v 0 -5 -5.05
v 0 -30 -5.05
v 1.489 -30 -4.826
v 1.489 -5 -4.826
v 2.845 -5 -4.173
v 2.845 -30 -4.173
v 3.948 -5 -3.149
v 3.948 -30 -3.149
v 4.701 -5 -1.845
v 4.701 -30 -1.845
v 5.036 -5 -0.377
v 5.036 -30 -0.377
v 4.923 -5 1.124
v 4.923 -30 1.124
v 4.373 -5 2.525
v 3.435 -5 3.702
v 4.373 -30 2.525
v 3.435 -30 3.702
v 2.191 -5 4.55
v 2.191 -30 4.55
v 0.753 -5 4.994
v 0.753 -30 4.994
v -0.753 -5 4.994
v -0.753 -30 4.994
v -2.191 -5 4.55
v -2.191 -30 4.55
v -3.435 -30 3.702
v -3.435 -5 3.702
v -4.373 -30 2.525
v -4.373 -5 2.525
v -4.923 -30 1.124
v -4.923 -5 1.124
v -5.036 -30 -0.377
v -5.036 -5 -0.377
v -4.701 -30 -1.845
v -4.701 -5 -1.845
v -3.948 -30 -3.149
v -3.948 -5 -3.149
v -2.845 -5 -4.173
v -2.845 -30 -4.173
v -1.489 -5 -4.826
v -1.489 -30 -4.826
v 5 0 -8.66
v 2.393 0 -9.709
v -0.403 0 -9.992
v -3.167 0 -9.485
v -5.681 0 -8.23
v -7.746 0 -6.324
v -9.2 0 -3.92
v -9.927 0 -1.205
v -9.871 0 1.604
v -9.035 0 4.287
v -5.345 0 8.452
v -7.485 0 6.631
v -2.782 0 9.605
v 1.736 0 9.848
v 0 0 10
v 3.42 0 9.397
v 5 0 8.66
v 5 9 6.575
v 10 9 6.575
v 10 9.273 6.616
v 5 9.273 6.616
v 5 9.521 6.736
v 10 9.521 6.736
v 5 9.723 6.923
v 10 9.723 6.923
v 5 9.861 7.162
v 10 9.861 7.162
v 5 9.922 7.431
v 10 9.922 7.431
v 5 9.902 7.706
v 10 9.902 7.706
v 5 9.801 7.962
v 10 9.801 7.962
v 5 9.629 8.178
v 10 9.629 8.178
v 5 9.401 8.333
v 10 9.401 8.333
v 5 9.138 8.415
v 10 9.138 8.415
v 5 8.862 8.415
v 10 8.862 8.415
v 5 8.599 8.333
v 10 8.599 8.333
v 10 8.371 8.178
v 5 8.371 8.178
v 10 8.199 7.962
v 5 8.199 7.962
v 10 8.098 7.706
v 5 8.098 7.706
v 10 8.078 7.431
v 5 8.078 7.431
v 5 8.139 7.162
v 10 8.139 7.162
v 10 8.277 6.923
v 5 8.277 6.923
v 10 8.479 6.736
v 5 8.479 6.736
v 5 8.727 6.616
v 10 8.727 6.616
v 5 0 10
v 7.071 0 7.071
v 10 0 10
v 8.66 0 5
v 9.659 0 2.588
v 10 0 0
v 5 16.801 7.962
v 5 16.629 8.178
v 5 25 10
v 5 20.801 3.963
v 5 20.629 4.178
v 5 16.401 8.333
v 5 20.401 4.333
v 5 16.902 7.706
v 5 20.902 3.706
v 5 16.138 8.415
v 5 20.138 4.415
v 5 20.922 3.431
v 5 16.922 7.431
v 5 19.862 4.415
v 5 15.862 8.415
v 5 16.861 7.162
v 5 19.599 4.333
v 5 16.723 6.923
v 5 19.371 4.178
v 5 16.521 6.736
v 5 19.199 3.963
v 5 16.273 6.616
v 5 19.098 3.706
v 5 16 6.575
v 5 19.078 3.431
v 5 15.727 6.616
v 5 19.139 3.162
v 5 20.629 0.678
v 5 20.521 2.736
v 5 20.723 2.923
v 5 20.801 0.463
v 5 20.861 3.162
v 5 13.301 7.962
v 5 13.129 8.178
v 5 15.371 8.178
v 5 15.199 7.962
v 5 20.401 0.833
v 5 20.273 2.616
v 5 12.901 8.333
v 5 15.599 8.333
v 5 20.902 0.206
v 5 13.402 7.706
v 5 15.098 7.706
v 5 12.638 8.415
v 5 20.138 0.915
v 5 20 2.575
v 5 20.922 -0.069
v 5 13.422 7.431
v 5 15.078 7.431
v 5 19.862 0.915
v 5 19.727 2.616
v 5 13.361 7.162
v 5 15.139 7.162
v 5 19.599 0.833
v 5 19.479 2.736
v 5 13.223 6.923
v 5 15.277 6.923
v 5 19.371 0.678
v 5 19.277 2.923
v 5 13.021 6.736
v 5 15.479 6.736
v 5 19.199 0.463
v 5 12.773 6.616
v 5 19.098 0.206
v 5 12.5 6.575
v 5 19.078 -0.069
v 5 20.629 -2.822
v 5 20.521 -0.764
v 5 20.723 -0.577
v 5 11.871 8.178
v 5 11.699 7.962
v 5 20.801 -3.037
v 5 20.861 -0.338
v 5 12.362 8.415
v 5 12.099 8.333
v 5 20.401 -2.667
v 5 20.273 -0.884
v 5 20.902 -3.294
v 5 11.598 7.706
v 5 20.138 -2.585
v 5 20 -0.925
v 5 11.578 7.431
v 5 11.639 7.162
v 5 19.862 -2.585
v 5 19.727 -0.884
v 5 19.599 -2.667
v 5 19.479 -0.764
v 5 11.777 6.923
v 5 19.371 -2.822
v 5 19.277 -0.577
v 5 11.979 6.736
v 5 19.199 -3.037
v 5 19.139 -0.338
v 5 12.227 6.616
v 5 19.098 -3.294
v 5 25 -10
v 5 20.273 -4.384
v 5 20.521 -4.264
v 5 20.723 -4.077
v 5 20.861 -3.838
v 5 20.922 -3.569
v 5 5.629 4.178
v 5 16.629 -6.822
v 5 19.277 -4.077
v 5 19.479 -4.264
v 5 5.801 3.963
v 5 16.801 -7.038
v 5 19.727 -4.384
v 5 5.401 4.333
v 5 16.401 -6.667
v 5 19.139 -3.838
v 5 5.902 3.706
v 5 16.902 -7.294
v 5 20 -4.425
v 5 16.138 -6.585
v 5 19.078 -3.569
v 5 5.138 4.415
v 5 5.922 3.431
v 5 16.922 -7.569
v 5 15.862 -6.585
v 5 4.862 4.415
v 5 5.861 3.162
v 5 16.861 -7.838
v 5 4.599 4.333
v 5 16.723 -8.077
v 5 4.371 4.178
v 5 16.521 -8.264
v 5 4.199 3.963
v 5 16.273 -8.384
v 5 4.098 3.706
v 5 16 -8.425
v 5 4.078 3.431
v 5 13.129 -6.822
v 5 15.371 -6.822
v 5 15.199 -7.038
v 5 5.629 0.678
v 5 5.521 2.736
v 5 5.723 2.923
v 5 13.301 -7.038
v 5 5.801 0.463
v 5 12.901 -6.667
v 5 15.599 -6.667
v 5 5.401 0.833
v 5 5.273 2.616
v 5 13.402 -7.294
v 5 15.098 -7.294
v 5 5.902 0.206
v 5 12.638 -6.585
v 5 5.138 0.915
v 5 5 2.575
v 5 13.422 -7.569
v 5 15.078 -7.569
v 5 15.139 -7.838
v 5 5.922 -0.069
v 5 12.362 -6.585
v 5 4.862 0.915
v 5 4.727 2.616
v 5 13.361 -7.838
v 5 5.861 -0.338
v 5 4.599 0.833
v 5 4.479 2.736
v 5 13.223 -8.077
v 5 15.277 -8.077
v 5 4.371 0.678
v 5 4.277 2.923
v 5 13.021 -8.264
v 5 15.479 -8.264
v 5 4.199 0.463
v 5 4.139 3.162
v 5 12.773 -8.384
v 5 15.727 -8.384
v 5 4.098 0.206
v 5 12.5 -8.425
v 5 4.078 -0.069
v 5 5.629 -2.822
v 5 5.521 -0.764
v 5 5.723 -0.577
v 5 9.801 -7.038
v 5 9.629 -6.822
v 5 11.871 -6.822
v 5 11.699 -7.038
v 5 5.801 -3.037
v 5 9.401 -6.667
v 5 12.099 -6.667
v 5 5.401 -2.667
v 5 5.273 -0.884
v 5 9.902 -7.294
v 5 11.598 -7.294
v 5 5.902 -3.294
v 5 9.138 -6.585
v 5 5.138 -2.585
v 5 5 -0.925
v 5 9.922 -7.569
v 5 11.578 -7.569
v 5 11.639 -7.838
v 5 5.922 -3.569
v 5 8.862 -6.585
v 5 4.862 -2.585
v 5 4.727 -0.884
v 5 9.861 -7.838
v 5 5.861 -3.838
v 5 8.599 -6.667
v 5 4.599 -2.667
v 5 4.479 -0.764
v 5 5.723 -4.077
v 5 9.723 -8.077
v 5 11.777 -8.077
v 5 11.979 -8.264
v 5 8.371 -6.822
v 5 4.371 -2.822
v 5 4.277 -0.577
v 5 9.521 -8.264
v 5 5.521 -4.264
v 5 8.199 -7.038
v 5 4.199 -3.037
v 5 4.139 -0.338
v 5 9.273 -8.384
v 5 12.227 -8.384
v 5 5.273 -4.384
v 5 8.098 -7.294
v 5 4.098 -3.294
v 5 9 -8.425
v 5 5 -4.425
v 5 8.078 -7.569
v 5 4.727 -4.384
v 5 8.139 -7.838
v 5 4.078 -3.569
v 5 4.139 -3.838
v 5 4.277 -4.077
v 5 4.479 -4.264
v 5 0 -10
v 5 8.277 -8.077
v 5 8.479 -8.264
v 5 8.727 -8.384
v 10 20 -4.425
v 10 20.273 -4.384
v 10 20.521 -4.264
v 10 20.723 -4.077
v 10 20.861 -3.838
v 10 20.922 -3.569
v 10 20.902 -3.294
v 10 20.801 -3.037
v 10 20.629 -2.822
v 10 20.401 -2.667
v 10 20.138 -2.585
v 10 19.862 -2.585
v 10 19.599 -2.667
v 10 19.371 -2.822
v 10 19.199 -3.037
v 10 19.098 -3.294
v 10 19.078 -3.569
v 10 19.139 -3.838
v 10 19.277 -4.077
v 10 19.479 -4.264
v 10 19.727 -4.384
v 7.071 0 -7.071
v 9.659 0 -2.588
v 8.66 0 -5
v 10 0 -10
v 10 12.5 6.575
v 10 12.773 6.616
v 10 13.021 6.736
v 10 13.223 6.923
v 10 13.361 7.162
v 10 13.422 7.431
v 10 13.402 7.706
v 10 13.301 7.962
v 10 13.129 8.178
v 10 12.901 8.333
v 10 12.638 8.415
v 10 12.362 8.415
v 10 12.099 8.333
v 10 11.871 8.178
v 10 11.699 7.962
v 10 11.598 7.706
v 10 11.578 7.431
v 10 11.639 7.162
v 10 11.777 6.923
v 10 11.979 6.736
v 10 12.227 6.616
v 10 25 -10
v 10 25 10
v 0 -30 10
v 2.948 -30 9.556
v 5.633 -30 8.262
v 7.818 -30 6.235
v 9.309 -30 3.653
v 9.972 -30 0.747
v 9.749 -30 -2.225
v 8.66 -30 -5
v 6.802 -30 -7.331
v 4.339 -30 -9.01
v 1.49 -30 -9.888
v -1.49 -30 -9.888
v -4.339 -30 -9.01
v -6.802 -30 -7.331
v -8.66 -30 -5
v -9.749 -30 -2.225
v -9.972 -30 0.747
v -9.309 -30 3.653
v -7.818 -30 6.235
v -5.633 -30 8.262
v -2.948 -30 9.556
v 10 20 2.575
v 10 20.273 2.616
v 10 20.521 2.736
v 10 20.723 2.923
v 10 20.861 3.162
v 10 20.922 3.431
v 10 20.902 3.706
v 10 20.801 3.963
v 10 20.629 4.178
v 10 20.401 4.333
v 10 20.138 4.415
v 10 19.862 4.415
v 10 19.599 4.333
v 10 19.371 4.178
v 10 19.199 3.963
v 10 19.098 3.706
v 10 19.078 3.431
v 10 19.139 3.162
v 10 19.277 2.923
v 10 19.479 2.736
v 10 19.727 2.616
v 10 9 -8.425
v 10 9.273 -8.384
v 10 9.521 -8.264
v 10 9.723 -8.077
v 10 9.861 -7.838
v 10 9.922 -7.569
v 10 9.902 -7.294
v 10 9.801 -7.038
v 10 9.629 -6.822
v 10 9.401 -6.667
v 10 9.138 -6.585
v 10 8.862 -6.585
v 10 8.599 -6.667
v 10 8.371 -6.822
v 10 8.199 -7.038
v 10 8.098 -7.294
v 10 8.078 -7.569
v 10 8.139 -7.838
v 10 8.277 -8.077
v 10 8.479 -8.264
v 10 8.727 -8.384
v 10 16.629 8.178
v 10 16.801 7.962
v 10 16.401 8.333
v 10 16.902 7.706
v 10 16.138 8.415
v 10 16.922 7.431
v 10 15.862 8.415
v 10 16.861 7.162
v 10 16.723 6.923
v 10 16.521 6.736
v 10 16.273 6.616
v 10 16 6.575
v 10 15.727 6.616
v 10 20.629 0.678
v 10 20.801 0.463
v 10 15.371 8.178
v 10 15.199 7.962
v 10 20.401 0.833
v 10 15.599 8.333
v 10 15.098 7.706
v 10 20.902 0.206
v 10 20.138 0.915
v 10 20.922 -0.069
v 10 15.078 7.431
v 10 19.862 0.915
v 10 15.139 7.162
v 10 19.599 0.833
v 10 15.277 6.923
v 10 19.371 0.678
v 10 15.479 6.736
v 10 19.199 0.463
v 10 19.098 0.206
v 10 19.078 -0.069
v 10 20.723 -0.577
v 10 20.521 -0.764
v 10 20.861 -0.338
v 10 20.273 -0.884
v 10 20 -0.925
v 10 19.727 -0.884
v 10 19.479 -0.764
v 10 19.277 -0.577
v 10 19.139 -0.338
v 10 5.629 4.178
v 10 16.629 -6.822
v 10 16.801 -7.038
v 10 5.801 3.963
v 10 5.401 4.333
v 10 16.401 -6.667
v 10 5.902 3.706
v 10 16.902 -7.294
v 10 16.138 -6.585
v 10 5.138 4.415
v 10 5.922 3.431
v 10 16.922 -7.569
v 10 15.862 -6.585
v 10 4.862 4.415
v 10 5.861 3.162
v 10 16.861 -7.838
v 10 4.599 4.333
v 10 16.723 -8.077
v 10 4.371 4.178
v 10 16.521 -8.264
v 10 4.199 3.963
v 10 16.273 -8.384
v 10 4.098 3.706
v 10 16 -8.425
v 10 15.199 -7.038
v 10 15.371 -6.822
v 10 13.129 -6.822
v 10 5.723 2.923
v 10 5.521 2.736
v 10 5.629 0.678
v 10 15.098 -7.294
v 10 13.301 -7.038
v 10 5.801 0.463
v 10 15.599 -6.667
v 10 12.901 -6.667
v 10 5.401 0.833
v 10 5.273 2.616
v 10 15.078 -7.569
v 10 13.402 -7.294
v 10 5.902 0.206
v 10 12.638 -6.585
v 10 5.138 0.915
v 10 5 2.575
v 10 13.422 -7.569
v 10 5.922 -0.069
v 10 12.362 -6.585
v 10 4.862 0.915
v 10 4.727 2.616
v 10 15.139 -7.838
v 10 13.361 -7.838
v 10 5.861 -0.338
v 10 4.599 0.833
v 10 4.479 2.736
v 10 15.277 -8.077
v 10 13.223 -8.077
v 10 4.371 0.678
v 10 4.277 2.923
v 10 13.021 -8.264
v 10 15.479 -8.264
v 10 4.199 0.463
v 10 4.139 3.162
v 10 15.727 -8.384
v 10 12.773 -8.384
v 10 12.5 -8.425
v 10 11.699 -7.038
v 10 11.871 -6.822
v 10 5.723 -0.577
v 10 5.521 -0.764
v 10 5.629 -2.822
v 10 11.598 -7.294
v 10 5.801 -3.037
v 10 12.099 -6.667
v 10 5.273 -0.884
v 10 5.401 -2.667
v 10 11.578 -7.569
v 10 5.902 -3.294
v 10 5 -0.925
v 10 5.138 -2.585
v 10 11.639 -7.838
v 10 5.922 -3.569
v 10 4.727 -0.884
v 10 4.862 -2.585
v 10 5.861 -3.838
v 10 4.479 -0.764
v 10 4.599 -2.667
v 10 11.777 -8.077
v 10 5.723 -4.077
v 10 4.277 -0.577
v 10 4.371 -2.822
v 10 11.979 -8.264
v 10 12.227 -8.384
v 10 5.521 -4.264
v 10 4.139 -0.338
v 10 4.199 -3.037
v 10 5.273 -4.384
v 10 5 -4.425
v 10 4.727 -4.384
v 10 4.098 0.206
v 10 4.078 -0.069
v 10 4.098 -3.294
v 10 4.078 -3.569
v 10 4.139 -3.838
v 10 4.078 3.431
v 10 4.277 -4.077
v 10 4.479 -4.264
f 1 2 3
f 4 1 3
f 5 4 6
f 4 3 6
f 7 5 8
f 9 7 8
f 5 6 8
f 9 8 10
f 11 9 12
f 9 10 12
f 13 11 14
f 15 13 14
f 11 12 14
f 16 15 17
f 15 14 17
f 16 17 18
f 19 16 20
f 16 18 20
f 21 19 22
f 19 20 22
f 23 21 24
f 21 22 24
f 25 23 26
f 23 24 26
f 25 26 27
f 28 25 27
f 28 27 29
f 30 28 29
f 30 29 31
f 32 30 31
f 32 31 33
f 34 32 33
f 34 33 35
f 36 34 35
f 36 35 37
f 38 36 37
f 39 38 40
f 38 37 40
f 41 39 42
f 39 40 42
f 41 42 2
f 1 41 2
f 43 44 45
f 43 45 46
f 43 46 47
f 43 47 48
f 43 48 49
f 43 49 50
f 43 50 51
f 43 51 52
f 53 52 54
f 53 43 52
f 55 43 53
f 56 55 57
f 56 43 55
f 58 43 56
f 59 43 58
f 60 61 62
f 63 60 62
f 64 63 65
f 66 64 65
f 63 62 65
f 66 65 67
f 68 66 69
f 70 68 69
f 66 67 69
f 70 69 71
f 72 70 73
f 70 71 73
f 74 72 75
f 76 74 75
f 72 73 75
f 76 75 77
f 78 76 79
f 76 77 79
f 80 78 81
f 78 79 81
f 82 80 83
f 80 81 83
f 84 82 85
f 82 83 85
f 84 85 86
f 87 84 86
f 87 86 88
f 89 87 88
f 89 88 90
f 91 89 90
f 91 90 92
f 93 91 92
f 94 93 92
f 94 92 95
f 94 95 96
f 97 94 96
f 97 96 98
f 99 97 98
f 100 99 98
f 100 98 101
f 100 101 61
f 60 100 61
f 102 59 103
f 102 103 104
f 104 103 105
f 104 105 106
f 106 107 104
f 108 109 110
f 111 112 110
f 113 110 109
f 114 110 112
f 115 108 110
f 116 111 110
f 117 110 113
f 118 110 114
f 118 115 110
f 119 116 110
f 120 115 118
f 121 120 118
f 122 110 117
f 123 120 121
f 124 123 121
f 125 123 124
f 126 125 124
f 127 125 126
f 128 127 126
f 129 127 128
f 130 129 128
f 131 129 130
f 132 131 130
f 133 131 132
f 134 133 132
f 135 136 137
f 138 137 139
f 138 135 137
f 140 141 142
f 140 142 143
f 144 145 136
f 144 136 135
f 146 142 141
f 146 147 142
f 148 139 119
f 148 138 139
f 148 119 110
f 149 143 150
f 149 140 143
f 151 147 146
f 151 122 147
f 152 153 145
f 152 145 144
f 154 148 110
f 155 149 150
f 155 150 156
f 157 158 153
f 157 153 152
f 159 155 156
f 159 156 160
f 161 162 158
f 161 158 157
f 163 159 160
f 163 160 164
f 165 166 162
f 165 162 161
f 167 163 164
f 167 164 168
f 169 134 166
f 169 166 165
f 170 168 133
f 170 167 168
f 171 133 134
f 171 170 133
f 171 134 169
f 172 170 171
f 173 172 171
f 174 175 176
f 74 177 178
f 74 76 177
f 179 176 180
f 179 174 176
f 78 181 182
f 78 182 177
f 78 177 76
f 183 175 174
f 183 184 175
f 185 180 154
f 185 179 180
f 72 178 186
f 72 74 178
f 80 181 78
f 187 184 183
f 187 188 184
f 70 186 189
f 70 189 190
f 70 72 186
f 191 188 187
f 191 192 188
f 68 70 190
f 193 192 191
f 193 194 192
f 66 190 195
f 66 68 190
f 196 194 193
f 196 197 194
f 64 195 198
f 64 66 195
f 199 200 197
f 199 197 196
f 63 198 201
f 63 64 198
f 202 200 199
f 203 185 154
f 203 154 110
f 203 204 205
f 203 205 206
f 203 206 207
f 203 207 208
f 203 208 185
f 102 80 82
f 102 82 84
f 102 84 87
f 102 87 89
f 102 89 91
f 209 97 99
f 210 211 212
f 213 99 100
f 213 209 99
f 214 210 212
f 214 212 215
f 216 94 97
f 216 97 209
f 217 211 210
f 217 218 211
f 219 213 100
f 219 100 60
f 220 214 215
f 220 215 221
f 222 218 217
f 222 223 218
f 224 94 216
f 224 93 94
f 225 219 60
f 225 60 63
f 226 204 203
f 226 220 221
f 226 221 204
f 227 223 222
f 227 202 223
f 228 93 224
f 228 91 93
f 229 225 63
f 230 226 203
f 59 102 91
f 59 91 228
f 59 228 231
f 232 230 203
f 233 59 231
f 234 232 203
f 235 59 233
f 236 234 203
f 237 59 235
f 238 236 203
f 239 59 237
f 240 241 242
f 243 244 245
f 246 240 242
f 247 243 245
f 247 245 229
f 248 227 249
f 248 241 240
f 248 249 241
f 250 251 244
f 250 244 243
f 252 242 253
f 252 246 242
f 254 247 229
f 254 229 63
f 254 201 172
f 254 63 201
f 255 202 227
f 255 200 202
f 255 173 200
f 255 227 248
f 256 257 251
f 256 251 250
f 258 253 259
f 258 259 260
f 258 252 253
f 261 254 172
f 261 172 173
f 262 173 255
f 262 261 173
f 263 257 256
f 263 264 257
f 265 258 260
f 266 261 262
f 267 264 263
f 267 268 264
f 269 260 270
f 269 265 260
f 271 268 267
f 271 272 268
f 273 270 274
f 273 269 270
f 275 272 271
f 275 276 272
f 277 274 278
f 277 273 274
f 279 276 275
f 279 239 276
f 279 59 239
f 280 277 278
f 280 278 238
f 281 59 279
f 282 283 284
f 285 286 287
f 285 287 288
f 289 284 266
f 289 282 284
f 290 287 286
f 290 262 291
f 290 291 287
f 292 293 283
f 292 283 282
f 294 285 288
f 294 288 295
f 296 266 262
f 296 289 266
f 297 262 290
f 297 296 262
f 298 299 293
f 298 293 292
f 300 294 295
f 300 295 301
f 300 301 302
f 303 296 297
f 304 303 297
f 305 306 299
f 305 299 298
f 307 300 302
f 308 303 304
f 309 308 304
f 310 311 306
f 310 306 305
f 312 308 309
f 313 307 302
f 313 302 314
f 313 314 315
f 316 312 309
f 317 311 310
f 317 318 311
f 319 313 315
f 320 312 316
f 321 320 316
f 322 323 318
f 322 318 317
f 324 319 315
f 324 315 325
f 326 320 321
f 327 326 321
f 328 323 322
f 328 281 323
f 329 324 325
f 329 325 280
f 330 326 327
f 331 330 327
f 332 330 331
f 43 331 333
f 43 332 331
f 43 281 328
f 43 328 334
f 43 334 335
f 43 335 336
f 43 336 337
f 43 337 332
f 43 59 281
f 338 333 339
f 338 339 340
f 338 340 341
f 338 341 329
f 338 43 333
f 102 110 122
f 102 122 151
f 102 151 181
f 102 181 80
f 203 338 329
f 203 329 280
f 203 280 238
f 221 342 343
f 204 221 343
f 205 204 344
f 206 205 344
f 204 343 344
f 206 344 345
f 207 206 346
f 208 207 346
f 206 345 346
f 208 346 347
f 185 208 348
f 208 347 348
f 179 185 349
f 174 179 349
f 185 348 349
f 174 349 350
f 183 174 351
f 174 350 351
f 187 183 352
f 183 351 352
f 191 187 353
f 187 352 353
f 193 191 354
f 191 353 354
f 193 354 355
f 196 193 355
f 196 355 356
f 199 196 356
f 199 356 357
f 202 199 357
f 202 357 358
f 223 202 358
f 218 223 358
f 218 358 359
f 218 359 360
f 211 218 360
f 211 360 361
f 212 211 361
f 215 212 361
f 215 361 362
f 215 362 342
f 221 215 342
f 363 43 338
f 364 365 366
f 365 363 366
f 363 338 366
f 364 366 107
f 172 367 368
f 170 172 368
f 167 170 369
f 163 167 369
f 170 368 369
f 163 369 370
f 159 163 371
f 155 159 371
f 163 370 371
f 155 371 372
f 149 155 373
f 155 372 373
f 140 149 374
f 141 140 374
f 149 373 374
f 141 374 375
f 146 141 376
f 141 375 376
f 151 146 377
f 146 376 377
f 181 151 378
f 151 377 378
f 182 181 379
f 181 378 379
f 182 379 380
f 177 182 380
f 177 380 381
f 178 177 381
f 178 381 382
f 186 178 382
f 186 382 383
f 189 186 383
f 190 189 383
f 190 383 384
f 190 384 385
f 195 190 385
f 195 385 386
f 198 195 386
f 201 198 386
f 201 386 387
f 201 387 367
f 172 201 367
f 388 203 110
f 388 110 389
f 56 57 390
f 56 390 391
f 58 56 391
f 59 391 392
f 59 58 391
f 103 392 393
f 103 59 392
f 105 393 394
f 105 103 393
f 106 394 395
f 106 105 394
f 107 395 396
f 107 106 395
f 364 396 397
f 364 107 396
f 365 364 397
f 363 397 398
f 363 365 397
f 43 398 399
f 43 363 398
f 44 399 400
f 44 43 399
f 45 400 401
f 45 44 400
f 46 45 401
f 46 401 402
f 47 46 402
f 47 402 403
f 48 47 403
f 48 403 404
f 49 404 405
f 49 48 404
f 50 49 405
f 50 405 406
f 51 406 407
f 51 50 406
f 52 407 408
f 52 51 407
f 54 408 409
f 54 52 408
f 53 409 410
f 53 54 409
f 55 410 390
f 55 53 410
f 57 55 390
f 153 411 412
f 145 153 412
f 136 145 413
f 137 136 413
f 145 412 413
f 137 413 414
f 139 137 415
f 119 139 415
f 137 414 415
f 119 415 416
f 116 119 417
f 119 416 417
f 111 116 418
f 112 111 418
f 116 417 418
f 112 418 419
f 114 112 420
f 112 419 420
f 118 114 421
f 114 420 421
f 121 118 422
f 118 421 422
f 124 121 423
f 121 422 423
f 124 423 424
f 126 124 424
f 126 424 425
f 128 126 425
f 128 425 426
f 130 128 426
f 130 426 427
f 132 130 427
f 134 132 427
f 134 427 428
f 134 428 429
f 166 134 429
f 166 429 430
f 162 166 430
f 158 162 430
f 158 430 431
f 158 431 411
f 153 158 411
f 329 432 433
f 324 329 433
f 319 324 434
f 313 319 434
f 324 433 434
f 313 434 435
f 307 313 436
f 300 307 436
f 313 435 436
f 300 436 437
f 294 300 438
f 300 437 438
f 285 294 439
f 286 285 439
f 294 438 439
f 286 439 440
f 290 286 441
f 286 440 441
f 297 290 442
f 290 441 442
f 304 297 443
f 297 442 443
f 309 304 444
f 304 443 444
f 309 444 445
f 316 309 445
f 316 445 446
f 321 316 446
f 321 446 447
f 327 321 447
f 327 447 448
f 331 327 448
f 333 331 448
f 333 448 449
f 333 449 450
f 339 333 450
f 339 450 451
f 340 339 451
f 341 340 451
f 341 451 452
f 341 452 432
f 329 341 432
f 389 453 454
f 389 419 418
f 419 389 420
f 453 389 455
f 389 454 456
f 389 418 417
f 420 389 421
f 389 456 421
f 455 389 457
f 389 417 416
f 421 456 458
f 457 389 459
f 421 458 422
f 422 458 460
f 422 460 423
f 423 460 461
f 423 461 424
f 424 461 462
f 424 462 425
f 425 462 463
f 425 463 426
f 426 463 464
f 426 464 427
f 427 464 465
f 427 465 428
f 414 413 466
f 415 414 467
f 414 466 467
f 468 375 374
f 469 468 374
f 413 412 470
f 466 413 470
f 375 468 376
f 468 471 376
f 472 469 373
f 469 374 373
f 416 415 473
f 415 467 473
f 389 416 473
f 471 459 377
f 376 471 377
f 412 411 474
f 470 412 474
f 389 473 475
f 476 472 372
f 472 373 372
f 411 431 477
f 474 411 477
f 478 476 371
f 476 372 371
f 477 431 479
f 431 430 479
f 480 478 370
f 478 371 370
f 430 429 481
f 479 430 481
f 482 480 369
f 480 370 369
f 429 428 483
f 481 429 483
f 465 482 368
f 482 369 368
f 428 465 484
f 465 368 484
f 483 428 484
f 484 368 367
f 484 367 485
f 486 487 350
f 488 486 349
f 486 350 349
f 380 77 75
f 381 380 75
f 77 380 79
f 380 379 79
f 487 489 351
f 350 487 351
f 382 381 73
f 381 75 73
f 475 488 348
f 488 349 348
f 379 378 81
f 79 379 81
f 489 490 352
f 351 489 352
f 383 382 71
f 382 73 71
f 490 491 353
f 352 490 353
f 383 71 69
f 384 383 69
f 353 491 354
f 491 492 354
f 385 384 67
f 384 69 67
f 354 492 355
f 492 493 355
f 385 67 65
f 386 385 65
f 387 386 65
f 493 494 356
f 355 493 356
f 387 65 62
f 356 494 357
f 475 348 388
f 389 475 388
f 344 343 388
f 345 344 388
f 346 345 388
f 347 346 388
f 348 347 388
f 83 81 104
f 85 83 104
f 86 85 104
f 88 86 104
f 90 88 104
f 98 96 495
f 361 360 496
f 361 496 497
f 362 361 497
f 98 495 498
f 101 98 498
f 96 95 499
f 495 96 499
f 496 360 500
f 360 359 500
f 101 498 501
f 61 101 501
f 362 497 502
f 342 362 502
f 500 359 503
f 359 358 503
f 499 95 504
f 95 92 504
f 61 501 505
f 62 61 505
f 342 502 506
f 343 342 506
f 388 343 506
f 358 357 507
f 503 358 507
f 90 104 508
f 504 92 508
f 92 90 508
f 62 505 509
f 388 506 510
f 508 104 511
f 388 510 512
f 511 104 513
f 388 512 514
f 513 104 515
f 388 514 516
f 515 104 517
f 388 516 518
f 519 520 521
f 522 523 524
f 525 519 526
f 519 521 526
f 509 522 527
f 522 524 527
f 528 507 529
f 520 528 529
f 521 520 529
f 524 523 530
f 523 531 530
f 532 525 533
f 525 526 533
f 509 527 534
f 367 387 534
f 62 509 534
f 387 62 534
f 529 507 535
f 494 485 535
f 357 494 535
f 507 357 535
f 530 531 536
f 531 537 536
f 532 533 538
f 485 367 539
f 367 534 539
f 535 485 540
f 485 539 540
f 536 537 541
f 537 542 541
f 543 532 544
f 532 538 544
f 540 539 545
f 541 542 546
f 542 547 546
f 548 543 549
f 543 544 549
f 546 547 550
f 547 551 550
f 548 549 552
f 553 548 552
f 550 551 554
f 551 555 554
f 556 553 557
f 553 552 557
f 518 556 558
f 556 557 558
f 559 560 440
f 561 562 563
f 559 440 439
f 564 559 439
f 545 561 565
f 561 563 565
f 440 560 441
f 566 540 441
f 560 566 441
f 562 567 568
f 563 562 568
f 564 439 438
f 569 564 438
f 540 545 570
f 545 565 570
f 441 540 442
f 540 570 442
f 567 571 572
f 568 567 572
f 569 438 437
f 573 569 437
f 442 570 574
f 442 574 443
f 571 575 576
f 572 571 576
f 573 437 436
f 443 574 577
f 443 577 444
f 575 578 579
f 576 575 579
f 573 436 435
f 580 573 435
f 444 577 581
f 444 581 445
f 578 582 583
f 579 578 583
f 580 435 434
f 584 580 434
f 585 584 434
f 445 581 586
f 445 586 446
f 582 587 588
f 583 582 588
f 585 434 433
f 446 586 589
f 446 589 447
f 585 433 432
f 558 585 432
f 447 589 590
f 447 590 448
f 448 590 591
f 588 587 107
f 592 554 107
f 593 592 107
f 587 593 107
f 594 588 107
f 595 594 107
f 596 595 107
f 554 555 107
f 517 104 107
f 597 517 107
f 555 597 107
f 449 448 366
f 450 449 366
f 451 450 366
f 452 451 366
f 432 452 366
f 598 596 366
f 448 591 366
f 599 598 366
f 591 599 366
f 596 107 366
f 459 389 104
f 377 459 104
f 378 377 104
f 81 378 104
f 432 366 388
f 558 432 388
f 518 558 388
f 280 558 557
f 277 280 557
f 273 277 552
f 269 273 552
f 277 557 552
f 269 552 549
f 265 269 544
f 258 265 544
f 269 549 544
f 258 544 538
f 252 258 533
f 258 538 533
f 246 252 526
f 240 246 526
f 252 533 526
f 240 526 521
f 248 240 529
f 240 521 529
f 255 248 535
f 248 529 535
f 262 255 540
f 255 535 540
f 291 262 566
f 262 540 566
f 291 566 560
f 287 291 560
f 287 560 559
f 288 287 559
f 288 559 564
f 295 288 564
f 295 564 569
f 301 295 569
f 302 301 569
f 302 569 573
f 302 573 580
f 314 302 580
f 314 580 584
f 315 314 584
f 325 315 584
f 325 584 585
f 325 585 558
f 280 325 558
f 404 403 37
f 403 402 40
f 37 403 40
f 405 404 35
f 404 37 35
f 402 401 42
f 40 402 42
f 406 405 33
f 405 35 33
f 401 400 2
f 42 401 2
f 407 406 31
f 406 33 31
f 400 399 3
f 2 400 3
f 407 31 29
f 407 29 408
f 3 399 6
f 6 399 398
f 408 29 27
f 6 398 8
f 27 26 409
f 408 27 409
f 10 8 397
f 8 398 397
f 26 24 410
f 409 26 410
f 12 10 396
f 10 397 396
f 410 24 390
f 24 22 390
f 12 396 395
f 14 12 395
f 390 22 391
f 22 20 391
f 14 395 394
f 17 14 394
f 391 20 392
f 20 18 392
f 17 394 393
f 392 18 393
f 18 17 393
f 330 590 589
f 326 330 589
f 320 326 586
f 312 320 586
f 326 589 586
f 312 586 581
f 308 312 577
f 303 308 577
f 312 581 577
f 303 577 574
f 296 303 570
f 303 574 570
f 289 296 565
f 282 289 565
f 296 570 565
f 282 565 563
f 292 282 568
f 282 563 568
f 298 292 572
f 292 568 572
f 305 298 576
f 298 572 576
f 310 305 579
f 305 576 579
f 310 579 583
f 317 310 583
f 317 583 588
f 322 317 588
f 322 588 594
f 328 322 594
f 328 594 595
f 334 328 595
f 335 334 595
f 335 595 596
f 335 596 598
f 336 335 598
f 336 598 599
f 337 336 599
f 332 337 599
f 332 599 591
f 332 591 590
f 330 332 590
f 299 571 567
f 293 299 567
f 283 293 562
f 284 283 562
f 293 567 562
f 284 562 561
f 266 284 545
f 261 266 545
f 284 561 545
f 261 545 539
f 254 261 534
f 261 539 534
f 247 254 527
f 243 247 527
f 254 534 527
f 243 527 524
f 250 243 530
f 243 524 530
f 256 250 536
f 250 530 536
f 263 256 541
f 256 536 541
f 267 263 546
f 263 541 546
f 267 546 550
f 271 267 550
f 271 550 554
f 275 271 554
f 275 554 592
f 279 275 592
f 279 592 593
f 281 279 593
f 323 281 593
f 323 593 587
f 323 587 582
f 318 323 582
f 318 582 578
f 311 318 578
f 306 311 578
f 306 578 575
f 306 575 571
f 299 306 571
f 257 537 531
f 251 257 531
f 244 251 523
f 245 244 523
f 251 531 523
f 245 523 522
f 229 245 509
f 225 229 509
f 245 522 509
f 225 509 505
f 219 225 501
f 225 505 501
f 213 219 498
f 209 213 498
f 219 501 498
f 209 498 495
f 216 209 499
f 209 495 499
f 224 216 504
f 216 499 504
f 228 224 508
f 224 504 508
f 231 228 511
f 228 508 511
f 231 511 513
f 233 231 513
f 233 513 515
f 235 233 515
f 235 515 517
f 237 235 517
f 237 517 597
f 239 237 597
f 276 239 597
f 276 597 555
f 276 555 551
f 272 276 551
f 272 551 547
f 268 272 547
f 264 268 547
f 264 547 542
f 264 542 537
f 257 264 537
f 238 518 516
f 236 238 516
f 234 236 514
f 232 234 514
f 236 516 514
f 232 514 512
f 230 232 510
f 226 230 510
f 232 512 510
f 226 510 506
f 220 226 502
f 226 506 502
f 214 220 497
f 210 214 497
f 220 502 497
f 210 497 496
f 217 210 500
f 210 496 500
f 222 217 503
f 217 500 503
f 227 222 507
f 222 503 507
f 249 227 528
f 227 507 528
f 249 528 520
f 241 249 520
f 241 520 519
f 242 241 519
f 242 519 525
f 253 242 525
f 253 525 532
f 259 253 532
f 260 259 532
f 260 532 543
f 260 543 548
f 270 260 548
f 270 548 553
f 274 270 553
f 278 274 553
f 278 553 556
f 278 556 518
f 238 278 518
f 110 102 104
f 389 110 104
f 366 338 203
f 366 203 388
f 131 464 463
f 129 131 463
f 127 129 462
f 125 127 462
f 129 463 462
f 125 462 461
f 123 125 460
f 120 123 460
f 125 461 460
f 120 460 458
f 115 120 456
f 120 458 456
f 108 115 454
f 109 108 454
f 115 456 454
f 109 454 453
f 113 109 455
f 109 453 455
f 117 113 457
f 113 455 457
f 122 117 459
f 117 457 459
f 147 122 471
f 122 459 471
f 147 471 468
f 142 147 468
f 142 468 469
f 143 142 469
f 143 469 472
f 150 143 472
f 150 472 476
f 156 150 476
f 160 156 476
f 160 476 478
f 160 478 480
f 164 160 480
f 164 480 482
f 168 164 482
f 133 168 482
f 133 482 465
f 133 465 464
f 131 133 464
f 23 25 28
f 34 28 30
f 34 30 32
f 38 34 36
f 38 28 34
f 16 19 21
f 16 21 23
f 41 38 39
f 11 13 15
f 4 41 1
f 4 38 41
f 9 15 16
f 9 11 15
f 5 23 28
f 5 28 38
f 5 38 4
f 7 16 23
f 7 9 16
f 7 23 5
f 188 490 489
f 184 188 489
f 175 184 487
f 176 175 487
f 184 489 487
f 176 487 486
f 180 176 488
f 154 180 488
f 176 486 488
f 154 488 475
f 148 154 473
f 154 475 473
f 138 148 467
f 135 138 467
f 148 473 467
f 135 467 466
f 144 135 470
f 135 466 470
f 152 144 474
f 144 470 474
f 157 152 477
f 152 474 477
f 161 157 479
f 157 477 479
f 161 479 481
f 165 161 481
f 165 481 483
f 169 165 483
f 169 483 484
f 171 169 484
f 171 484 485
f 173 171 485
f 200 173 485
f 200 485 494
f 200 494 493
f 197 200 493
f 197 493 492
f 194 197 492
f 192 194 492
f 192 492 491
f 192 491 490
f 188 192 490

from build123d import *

# Parameters (mm, degrees)
SKETCH_1_R          = 10
EXTRUDE_1_DEPTH     = 30
SKETCH_1_3_W        = 5
SKETCH_1_3_H        = 20
EXTRUDE_2_DEPTH     = 25
SKETCH_2_R          = 0.925
CUT_EXTRUDE_1_DEPTH = 38.416573868
SKETCH_3_R          = 5.05
CUT_EXTRUDE_2_DEPTH = 25


with BuildPart() as part:
    # Эскиз1 → Бобышка-Вытянуть1 (new body)
    with BuildSketch(Plane(origin=(0, 0, 0), x_dir=(1, 0, 0), z_dir=(0, 1, 0))):
        Circle(SKETCH_1_R)
    extrude(amount=-EXTRUDE_1_DEPTH)

    # Эскиз1<3> → Бобышка-Вытянуть2 (add)
    with BuildSketch(Plane(origin=(0, 0, 0), x_dir=(1, 0, 0), z_dir=(0, 1, 0))):
        with Locations((7.5, 0)):
            Rectangle(SKETCH_1_3_W, SKETCH_1_3_H)
    extrude(amount=EXTRUDE_2_DEPTH)

    # Эскиз2 → Вырез-Вытянуть1 (cut, through all)
    with BuildSketch(Plane(origin=(10, 0, 0), x_dir=(0, 0, -1), z_dir=(1, 0, 0))):
        with Locations((0, 5)):
            Circle(SKETCH_2_R)
        with Locations((3.5, 5)):
            Circle(SKETCH_2_R)
        with Locations((-3.5, 5)):
            Circle(SKETCH_2_R)
        with Locations((0, 20)):
            Circle(SKETCH_2_R)
        with Locations((-3.5, 20)):
            Circle(SKETCH_2_R)
        with Locations((3.5, 20)):
            Circle(SKETCH_2_R)
        with Locations((-7.5, 12.5)):
            Circle(SKETCH_2_R)
        with Locations((7.5, 12.5)):
            Circle(SKETCH_2_R)
        with Locations((-7.5, 9)):
            Circle(SKETCH_2_R)
        with Locations((-7.5, 16)):
            Circle(SKETCH_2_R)
        with Locations((7.5, 9)):
            Circle(SKETCH_2_R)
        with Locations((7.5, 16)):
            Circle(SKETCH_2_R)
    extrude(amount=-CUT_EXTRUDE_1_DEPTH, mode=Mode.SUBTRACT)

    # Эскиз3 → Вырез-Вытянуть2 (cut)
    with BuildSketch(Plane.XZ.offset(30)):
        Circle(SKETCH_3_R)
    extrude(amount=-CUT_EXTRUDE_2_DEPTH, mode=Mode.SUBTRACT)


solid = part.part
